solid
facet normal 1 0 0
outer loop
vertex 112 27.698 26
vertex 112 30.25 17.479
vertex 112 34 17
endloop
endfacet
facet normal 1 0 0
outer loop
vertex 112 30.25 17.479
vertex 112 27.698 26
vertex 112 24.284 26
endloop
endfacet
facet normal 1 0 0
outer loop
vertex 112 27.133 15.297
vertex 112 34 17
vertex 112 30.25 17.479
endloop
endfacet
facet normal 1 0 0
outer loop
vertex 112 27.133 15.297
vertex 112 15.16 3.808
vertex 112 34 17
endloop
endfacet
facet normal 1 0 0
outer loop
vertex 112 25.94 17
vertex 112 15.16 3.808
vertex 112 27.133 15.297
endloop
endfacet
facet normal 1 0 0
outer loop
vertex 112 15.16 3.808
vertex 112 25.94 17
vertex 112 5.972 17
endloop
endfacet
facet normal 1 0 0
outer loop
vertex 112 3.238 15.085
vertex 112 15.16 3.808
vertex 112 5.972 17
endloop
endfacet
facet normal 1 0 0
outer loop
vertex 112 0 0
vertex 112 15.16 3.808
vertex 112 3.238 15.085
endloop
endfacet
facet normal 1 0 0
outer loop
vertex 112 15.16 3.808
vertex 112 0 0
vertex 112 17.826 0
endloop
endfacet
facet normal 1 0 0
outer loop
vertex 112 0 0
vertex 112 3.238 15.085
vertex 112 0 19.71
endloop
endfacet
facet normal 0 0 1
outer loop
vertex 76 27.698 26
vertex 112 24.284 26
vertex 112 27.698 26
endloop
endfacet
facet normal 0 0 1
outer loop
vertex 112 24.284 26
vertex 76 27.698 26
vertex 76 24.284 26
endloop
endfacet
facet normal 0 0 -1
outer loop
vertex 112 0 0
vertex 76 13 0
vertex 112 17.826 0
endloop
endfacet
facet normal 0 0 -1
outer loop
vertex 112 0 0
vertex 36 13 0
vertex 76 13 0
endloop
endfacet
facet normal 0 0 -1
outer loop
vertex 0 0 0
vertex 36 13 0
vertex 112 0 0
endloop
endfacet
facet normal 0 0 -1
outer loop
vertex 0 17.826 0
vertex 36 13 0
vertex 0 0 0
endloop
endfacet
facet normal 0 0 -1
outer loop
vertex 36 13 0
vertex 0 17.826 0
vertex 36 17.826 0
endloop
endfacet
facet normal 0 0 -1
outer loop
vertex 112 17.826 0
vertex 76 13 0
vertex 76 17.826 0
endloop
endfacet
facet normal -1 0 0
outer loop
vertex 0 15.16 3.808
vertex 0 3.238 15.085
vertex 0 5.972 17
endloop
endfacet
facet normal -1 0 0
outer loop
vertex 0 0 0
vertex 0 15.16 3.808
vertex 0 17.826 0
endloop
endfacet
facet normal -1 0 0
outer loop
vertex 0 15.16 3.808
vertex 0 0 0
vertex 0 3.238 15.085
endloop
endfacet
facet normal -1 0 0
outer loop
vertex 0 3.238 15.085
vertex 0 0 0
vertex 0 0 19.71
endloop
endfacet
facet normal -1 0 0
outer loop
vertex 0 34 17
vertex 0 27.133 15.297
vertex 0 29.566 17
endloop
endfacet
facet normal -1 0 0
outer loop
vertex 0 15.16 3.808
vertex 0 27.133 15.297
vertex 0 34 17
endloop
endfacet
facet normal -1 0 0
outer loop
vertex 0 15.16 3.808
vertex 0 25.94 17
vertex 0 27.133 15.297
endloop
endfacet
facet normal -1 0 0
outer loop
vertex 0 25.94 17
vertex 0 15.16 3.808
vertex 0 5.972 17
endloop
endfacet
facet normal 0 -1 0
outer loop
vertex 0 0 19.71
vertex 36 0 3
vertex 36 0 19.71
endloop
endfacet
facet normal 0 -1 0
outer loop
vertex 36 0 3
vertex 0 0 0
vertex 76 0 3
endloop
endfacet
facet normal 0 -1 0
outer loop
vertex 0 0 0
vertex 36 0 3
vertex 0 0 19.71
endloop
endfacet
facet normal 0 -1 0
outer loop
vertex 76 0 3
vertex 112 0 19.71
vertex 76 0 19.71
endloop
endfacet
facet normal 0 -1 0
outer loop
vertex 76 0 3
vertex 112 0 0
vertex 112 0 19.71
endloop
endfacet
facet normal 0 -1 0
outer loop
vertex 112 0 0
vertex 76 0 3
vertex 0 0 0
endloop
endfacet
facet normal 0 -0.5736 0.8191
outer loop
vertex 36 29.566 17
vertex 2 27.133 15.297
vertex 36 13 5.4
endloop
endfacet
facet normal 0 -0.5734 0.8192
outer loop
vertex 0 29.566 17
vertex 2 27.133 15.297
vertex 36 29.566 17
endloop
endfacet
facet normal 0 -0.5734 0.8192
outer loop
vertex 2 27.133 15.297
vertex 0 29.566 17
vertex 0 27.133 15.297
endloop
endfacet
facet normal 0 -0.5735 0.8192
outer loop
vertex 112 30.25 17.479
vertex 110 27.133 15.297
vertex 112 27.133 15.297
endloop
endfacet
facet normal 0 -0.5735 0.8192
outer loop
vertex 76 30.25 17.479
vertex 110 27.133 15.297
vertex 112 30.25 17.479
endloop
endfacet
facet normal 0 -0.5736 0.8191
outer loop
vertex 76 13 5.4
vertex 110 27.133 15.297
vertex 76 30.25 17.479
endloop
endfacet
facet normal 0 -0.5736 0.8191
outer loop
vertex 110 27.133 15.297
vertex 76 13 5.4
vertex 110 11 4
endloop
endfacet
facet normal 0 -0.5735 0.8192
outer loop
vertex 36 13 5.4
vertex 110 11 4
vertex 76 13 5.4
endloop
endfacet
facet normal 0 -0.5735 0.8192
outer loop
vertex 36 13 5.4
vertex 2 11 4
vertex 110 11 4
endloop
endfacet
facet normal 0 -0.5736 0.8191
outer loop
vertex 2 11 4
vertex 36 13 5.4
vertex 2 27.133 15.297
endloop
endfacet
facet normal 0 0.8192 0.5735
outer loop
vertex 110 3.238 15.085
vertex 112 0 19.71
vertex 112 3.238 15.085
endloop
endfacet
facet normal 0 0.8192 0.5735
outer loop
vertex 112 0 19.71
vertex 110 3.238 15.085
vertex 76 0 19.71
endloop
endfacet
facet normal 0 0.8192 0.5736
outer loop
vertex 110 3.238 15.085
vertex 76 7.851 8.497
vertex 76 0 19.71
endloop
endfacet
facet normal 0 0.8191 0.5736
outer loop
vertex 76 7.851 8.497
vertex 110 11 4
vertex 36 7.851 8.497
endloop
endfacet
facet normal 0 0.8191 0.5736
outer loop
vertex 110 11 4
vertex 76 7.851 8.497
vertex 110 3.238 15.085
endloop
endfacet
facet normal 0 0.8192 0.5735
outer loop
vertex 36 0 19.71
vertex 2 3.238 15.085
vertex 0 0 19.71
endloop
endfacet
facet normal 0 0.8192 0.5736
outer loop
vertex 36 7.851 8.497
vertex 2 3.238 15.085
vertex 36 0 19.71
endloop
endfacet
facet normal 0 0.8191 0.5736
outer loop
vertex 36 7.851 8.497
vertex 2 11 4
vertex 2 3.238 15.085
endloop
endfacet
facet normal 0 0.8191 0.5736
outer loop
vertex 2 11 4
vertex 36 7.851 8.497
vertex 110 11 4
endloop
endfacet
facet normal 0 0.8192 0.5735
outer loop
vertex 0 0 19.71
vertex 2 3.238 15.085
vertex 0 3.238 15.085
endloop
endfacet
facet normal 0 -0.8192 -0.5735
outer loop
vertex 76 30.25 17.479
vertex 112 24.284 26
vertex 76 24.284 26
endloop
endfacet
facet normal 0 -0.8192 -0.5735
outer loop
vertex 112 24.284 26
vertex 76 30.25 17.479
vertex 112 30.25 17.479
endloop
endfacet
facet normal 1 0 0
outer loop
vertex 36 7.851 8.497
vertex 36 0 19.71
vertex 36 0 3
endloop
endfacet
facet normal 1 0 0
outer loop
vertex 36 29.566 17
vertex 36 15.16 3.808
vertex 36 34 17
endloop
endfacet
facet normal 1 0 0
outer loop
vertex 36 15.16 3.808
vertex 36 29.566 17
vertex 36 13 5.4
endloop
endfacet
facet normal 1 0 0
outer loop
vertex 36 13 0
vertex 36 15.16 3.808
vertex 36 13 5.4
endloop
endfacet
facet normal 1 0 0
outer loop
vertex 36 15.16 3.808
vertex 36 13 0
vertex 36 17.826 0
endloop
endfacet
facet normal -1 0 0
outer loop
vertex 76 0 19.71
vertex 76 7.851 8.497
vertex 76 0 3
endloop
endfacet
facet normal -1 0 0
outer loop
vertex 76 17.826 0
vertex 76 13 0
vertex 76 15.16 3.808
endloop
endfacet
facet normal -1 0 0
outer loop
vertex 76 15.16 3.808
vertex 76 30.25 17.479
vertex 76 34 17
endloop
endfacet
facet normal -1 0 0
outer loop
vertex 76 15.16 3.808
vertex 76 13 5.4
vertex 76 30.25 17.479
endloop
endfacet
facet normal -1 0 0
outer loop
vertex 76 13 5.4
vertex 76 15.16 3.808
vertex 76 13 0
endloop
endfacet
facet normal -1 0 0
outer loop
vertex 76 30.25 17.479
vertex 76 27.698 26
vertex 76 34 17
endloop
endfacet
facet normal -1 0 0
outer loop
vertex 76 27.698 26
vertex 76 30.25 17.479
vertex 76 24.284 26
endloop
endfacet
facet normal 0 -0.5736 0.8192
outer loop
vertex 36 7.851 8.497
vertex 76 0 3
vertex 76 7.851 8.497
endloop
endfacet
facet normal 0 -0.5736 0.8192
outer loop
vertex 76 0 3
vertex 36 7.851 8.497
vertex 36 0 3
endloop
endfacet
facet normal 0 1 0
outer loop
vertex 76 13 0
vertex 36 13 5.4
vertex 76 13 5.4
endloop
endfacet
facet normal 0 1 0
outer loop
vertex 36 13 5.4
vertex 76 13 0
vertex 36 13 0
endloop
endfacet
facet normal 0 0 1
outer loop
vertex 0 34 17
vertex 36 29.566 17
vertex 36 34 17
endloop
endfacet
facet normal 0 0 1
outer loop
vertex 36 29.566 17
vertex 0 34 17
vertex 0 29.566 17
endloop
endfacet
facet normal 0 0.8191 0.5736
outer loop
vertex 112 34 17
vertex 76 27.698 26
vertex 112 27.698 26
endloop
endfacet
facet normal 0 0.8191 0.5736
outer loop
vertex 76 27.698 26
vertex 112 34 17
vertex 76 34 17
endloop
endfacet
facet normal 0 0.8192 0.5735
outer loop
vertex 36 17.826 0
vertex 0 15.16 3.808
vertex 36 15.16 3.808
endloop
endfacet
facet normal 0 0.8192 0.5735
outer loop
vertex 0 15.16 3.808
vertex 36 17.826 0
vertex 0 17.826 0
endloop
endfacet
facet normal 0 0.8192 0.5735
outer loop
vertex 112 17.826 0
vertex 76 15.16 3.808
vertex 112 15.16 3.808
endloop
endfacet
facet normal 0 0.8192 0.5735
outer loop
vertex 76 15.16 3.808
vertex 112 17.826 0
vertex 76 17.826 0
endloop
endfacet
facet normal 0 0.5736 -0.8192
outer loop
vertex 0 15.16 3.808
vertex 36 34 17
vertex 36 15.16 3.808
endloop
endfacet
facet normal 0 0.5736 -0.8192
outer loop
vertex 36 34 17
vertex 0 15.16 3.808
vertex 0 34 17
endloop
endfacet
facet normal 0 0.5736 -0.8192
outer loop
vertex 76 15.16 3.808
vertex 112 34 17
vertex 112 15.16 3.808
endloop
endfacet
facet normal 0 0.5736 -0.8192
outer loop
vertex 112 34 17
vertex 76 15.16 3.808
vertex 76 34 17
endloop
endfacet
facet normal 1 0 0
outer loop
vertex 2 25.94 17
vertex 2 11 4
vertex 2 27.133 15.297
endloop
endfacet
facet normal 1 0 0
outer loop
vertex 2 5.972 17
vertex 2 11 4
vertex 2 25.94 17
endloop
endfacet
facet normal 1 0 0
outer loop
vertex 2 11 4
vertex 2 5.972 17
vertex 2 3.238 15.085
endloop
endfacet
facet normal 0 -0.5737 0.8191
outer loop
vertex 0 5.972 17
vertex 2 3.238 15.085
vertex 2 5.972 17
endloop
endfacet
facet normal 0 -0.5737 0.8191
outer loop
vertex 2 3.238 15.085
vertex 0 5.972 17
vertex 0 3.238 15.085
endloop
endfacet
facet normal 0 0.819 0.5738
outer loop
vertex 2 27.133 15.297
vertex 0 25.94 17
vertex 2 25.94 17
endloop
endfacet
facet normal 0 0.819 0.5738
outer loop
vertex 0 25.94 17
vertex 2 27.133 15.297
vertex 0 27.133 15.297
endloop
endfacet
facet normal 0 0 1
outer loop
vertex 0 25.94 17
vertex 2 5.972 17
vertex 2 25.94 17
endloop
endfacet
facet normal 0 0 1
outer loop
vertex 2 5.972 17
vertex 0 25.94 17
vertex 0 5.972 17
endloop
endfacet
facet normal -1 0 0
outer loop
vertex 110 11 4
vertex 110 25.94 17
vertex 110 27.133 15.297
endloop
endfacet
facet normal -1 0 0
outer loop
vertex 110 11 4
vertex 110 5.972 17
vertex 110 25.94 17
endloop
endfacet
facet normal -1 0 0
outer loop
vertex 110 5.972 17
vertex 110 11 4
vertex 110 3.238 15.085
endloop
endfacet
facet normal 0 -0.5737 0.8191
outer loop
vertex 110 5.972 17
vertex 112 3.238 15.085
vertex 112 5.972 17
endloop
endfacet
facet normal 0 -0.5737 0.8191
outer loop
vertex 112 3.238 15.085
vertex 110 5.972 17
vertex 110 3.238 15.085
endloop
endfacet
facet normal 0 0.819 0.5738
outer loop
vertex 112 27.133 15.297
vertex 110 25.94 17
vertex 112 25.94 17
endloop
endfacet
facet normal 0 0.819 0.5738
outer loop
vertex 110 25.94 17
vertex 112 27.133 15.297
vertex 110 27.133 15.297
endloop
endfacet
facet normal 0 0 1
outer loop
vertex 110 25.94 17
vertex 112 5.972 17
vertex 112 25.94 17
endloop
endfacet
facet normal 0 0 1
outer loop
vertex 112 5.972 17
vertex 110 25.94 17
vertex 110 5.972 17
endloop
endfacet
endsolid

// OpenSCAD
// Cube with rounded edges

el = 1e-2;

module rcube_rcorner ( r, fn )
{
   difference() {
      translate ( -el * [ 1, 1, 1 ] ) cube( r + el );
      translate ( [ r, r, r ] ) sphere( r, $fn = fn );
   }
}

module rcube_redge ( r, l, fn )
{
   difference() {
      translate ( -2 * el * [ 1, 1, 1 ] ) cube( [ r + 2 * el, r + 2 * el, l + 4 * el ] );
      translate ( [ r, r, -el ] ) cylinder( r = r, h = l + 2 * el, $fn = fn );
   }
}

module rcube( size = 1, center = false, r = 0, $fn = 20 )
{
        sz = len( size ) == undef ? [ size, size, size ] : size;
        displacement = center == true ? -size / 2: [ 0, 0, 0 ];

        translate( displacement ) {
                difference() {
                        cube( size = sz );
                        union (){
                                // Round the edges:

                                rcube_redge( r, sz[2], fn = $fn );
                                translate( [ sz[0], 0, 0 ] ) rotate( 90, [ 0, 0, 1 ] ) rcube_redge( r, sz[2], fn = $fn );
                                translate( [ sz[0], sz[1], 0 ] ) rotate( 180, [ 0, 0, 1 ] ) rcube_redge( r, sz[2], fn = $fn );
                                translate( [ 0, sz[1], 0 ] ) rotate( 270, [ 0, 0, 1 ] ) rcube_redge( r, sz[2], fn = $fn );

                                translate( [ 0, sz[1], 0 ] ) rotate ( 90, [ 1, 0, 0 ] ) rcube_redge( r, sz[1], fn = $fn );
                                translate( [ 0, 0, sz[2] ] ) rotate ( -90, [ 1, 0, 0 ] ) rcube_redge( r, sz[1], fn = $fn );
                                translate( [ sz[0], 0, 0 ] ) rotate ( 180, [ 0, 1, 1 ] ) rcube_redge( r, sz[1], fn = $fn );
                                translate( [ sz[0], sz[1], sz[2] ] ) rotate ( 180, [ 0, 1, -1 ] ) rcube_redge( r, sz[1], fn = $fn );

                                translate( [ sz[0], 0, 0 ] ) rotate( -90, [ 0, 1, 0 ] )  rcube_redge( r, sz[0], fn = $fn );
                                translate( [ 0, 0, sz[2] ] ) rotate( 90, [ 0, 1, 0 ] )  rcube_redge( r, sz[0], fn = $fn );
                                translate( [ 0, sz[1], 0 ] ) rotate( 180, [ 1, 0, 1 ] )  rcube_redge( r, sz[0], fn = $fn );
                                translate( [ sz[0], sz[1], sz[2] ] ) rotate( 180, [ 1, 0, -1 ] )  rcube_redge( r, sz[0], fn = $fn );

                                // Round the corners:
                                rcube_rcorner( r, fn = $fn );
                                translate( [ sz[0], 0, 0 ] ) rotate( 90, [ 0, 0, 1 ] ) rcube_rcorner( r, fn = $fn );
                                translate( [ sz[0], sz[1], 0 ] ) rotate( 180, [ 0, 0, 1 ] ) rcube_rcorner( r, fn = $fn );
                                translate( [ 0, sz[1], 0 ] ) rotate( 270, [ 0, 0, 1 ] ) rcube_rcorner( r, fn = $fn );

                                translate( [ 0, 0, sz[2] ] ) rotate( 90, [ 0, 0, 1 ] ) rotate( 180, [ 1, 0, 0 ] ) rcube_rcorner( r, fn = $fn );
                                translate( [ sz[0], 0, sz[2] ] ) rotate( 180, [ 0, 0, 1 ] ) rotate( 180, [ 1, 0, 0 ] ) rcube_rcorner( r, fn = $fn );
                                translate( [ sz[0], sz[1], sz[2] ] ) rotate( 270, [ 0, 0, 1 ] ) rotate( 180, [ 1, 0, 0 ] ) rcube_rcorner( r, fn = $fn );
                                translate( [ 0, sz[1], sz[2] ] ) rotate( 180, [ 1, 0, 0 ] ) rcube_rcorner( r, fn = $fn );

                        }
                }
        }
}

render( convexity = 10 ) {
    
    difference(){
        cube( [ 112, 36, 26 ], r = 2 );
        
        translate( [ 0, 11, 4 ] )
            rotate( 35, [ 1, 0, 0 ] )
                translate( [ -1, 0, 0 ] )
                    cube( [ 114, 23.5, 35 ] );
        translate( [ 0, 0, 3 ] )
            rotate( 35, [ 1, 0, 0 ] )
                translate( [ ( 112 - 40 ) / 2, 0, 0 ] )
                    cube( [ 40, 35, 35 ] );
        translate( [ ( 112 - 40 ) / 2, 13, 0 ] )
            cube( [ 40, 40, 50 ] );
        translate( [ 0, 20, 17 ] )
            cube( [ 40, 20, 50 ] );

        translate( [ 75, 34, 17 ] )
            rotate( 35, [ 1, 0, 0 ] )
                translate( [ 0, 0, -10 ] )
                    cube( [ 40, 20, 50 ] );
        translate( [ -1, 34, 17 ] )
            rotate( 90 + 35, [ 1, 0, 0 ] )
                translate( [ 0, -20, -27 ] )
                    cube( [ 160, 20, 50 ] );
    }
    difference(){
        rotate( 35, [ 1, 0, 0 ] )
            translate( [ 0, 11, -3.5 ] )
                cube( [ 2, 20, 14 ] );
        translate( [ -1, 0, 17 ] )
            cube( [ 10, 50, 10 ] );
    }
    translate( [ 110, 0, 0 ] )
        difference(){
            rotate( 35, [ 1, 0, 0 ] )
                translate( [ 0, 11, -3.5 ] )
                    cube( [ 2, 20, 14 ] );
            translate( [ -1, 0, 17 ] )
                cube( [ 10, 50, 10 ] );
        }
}
